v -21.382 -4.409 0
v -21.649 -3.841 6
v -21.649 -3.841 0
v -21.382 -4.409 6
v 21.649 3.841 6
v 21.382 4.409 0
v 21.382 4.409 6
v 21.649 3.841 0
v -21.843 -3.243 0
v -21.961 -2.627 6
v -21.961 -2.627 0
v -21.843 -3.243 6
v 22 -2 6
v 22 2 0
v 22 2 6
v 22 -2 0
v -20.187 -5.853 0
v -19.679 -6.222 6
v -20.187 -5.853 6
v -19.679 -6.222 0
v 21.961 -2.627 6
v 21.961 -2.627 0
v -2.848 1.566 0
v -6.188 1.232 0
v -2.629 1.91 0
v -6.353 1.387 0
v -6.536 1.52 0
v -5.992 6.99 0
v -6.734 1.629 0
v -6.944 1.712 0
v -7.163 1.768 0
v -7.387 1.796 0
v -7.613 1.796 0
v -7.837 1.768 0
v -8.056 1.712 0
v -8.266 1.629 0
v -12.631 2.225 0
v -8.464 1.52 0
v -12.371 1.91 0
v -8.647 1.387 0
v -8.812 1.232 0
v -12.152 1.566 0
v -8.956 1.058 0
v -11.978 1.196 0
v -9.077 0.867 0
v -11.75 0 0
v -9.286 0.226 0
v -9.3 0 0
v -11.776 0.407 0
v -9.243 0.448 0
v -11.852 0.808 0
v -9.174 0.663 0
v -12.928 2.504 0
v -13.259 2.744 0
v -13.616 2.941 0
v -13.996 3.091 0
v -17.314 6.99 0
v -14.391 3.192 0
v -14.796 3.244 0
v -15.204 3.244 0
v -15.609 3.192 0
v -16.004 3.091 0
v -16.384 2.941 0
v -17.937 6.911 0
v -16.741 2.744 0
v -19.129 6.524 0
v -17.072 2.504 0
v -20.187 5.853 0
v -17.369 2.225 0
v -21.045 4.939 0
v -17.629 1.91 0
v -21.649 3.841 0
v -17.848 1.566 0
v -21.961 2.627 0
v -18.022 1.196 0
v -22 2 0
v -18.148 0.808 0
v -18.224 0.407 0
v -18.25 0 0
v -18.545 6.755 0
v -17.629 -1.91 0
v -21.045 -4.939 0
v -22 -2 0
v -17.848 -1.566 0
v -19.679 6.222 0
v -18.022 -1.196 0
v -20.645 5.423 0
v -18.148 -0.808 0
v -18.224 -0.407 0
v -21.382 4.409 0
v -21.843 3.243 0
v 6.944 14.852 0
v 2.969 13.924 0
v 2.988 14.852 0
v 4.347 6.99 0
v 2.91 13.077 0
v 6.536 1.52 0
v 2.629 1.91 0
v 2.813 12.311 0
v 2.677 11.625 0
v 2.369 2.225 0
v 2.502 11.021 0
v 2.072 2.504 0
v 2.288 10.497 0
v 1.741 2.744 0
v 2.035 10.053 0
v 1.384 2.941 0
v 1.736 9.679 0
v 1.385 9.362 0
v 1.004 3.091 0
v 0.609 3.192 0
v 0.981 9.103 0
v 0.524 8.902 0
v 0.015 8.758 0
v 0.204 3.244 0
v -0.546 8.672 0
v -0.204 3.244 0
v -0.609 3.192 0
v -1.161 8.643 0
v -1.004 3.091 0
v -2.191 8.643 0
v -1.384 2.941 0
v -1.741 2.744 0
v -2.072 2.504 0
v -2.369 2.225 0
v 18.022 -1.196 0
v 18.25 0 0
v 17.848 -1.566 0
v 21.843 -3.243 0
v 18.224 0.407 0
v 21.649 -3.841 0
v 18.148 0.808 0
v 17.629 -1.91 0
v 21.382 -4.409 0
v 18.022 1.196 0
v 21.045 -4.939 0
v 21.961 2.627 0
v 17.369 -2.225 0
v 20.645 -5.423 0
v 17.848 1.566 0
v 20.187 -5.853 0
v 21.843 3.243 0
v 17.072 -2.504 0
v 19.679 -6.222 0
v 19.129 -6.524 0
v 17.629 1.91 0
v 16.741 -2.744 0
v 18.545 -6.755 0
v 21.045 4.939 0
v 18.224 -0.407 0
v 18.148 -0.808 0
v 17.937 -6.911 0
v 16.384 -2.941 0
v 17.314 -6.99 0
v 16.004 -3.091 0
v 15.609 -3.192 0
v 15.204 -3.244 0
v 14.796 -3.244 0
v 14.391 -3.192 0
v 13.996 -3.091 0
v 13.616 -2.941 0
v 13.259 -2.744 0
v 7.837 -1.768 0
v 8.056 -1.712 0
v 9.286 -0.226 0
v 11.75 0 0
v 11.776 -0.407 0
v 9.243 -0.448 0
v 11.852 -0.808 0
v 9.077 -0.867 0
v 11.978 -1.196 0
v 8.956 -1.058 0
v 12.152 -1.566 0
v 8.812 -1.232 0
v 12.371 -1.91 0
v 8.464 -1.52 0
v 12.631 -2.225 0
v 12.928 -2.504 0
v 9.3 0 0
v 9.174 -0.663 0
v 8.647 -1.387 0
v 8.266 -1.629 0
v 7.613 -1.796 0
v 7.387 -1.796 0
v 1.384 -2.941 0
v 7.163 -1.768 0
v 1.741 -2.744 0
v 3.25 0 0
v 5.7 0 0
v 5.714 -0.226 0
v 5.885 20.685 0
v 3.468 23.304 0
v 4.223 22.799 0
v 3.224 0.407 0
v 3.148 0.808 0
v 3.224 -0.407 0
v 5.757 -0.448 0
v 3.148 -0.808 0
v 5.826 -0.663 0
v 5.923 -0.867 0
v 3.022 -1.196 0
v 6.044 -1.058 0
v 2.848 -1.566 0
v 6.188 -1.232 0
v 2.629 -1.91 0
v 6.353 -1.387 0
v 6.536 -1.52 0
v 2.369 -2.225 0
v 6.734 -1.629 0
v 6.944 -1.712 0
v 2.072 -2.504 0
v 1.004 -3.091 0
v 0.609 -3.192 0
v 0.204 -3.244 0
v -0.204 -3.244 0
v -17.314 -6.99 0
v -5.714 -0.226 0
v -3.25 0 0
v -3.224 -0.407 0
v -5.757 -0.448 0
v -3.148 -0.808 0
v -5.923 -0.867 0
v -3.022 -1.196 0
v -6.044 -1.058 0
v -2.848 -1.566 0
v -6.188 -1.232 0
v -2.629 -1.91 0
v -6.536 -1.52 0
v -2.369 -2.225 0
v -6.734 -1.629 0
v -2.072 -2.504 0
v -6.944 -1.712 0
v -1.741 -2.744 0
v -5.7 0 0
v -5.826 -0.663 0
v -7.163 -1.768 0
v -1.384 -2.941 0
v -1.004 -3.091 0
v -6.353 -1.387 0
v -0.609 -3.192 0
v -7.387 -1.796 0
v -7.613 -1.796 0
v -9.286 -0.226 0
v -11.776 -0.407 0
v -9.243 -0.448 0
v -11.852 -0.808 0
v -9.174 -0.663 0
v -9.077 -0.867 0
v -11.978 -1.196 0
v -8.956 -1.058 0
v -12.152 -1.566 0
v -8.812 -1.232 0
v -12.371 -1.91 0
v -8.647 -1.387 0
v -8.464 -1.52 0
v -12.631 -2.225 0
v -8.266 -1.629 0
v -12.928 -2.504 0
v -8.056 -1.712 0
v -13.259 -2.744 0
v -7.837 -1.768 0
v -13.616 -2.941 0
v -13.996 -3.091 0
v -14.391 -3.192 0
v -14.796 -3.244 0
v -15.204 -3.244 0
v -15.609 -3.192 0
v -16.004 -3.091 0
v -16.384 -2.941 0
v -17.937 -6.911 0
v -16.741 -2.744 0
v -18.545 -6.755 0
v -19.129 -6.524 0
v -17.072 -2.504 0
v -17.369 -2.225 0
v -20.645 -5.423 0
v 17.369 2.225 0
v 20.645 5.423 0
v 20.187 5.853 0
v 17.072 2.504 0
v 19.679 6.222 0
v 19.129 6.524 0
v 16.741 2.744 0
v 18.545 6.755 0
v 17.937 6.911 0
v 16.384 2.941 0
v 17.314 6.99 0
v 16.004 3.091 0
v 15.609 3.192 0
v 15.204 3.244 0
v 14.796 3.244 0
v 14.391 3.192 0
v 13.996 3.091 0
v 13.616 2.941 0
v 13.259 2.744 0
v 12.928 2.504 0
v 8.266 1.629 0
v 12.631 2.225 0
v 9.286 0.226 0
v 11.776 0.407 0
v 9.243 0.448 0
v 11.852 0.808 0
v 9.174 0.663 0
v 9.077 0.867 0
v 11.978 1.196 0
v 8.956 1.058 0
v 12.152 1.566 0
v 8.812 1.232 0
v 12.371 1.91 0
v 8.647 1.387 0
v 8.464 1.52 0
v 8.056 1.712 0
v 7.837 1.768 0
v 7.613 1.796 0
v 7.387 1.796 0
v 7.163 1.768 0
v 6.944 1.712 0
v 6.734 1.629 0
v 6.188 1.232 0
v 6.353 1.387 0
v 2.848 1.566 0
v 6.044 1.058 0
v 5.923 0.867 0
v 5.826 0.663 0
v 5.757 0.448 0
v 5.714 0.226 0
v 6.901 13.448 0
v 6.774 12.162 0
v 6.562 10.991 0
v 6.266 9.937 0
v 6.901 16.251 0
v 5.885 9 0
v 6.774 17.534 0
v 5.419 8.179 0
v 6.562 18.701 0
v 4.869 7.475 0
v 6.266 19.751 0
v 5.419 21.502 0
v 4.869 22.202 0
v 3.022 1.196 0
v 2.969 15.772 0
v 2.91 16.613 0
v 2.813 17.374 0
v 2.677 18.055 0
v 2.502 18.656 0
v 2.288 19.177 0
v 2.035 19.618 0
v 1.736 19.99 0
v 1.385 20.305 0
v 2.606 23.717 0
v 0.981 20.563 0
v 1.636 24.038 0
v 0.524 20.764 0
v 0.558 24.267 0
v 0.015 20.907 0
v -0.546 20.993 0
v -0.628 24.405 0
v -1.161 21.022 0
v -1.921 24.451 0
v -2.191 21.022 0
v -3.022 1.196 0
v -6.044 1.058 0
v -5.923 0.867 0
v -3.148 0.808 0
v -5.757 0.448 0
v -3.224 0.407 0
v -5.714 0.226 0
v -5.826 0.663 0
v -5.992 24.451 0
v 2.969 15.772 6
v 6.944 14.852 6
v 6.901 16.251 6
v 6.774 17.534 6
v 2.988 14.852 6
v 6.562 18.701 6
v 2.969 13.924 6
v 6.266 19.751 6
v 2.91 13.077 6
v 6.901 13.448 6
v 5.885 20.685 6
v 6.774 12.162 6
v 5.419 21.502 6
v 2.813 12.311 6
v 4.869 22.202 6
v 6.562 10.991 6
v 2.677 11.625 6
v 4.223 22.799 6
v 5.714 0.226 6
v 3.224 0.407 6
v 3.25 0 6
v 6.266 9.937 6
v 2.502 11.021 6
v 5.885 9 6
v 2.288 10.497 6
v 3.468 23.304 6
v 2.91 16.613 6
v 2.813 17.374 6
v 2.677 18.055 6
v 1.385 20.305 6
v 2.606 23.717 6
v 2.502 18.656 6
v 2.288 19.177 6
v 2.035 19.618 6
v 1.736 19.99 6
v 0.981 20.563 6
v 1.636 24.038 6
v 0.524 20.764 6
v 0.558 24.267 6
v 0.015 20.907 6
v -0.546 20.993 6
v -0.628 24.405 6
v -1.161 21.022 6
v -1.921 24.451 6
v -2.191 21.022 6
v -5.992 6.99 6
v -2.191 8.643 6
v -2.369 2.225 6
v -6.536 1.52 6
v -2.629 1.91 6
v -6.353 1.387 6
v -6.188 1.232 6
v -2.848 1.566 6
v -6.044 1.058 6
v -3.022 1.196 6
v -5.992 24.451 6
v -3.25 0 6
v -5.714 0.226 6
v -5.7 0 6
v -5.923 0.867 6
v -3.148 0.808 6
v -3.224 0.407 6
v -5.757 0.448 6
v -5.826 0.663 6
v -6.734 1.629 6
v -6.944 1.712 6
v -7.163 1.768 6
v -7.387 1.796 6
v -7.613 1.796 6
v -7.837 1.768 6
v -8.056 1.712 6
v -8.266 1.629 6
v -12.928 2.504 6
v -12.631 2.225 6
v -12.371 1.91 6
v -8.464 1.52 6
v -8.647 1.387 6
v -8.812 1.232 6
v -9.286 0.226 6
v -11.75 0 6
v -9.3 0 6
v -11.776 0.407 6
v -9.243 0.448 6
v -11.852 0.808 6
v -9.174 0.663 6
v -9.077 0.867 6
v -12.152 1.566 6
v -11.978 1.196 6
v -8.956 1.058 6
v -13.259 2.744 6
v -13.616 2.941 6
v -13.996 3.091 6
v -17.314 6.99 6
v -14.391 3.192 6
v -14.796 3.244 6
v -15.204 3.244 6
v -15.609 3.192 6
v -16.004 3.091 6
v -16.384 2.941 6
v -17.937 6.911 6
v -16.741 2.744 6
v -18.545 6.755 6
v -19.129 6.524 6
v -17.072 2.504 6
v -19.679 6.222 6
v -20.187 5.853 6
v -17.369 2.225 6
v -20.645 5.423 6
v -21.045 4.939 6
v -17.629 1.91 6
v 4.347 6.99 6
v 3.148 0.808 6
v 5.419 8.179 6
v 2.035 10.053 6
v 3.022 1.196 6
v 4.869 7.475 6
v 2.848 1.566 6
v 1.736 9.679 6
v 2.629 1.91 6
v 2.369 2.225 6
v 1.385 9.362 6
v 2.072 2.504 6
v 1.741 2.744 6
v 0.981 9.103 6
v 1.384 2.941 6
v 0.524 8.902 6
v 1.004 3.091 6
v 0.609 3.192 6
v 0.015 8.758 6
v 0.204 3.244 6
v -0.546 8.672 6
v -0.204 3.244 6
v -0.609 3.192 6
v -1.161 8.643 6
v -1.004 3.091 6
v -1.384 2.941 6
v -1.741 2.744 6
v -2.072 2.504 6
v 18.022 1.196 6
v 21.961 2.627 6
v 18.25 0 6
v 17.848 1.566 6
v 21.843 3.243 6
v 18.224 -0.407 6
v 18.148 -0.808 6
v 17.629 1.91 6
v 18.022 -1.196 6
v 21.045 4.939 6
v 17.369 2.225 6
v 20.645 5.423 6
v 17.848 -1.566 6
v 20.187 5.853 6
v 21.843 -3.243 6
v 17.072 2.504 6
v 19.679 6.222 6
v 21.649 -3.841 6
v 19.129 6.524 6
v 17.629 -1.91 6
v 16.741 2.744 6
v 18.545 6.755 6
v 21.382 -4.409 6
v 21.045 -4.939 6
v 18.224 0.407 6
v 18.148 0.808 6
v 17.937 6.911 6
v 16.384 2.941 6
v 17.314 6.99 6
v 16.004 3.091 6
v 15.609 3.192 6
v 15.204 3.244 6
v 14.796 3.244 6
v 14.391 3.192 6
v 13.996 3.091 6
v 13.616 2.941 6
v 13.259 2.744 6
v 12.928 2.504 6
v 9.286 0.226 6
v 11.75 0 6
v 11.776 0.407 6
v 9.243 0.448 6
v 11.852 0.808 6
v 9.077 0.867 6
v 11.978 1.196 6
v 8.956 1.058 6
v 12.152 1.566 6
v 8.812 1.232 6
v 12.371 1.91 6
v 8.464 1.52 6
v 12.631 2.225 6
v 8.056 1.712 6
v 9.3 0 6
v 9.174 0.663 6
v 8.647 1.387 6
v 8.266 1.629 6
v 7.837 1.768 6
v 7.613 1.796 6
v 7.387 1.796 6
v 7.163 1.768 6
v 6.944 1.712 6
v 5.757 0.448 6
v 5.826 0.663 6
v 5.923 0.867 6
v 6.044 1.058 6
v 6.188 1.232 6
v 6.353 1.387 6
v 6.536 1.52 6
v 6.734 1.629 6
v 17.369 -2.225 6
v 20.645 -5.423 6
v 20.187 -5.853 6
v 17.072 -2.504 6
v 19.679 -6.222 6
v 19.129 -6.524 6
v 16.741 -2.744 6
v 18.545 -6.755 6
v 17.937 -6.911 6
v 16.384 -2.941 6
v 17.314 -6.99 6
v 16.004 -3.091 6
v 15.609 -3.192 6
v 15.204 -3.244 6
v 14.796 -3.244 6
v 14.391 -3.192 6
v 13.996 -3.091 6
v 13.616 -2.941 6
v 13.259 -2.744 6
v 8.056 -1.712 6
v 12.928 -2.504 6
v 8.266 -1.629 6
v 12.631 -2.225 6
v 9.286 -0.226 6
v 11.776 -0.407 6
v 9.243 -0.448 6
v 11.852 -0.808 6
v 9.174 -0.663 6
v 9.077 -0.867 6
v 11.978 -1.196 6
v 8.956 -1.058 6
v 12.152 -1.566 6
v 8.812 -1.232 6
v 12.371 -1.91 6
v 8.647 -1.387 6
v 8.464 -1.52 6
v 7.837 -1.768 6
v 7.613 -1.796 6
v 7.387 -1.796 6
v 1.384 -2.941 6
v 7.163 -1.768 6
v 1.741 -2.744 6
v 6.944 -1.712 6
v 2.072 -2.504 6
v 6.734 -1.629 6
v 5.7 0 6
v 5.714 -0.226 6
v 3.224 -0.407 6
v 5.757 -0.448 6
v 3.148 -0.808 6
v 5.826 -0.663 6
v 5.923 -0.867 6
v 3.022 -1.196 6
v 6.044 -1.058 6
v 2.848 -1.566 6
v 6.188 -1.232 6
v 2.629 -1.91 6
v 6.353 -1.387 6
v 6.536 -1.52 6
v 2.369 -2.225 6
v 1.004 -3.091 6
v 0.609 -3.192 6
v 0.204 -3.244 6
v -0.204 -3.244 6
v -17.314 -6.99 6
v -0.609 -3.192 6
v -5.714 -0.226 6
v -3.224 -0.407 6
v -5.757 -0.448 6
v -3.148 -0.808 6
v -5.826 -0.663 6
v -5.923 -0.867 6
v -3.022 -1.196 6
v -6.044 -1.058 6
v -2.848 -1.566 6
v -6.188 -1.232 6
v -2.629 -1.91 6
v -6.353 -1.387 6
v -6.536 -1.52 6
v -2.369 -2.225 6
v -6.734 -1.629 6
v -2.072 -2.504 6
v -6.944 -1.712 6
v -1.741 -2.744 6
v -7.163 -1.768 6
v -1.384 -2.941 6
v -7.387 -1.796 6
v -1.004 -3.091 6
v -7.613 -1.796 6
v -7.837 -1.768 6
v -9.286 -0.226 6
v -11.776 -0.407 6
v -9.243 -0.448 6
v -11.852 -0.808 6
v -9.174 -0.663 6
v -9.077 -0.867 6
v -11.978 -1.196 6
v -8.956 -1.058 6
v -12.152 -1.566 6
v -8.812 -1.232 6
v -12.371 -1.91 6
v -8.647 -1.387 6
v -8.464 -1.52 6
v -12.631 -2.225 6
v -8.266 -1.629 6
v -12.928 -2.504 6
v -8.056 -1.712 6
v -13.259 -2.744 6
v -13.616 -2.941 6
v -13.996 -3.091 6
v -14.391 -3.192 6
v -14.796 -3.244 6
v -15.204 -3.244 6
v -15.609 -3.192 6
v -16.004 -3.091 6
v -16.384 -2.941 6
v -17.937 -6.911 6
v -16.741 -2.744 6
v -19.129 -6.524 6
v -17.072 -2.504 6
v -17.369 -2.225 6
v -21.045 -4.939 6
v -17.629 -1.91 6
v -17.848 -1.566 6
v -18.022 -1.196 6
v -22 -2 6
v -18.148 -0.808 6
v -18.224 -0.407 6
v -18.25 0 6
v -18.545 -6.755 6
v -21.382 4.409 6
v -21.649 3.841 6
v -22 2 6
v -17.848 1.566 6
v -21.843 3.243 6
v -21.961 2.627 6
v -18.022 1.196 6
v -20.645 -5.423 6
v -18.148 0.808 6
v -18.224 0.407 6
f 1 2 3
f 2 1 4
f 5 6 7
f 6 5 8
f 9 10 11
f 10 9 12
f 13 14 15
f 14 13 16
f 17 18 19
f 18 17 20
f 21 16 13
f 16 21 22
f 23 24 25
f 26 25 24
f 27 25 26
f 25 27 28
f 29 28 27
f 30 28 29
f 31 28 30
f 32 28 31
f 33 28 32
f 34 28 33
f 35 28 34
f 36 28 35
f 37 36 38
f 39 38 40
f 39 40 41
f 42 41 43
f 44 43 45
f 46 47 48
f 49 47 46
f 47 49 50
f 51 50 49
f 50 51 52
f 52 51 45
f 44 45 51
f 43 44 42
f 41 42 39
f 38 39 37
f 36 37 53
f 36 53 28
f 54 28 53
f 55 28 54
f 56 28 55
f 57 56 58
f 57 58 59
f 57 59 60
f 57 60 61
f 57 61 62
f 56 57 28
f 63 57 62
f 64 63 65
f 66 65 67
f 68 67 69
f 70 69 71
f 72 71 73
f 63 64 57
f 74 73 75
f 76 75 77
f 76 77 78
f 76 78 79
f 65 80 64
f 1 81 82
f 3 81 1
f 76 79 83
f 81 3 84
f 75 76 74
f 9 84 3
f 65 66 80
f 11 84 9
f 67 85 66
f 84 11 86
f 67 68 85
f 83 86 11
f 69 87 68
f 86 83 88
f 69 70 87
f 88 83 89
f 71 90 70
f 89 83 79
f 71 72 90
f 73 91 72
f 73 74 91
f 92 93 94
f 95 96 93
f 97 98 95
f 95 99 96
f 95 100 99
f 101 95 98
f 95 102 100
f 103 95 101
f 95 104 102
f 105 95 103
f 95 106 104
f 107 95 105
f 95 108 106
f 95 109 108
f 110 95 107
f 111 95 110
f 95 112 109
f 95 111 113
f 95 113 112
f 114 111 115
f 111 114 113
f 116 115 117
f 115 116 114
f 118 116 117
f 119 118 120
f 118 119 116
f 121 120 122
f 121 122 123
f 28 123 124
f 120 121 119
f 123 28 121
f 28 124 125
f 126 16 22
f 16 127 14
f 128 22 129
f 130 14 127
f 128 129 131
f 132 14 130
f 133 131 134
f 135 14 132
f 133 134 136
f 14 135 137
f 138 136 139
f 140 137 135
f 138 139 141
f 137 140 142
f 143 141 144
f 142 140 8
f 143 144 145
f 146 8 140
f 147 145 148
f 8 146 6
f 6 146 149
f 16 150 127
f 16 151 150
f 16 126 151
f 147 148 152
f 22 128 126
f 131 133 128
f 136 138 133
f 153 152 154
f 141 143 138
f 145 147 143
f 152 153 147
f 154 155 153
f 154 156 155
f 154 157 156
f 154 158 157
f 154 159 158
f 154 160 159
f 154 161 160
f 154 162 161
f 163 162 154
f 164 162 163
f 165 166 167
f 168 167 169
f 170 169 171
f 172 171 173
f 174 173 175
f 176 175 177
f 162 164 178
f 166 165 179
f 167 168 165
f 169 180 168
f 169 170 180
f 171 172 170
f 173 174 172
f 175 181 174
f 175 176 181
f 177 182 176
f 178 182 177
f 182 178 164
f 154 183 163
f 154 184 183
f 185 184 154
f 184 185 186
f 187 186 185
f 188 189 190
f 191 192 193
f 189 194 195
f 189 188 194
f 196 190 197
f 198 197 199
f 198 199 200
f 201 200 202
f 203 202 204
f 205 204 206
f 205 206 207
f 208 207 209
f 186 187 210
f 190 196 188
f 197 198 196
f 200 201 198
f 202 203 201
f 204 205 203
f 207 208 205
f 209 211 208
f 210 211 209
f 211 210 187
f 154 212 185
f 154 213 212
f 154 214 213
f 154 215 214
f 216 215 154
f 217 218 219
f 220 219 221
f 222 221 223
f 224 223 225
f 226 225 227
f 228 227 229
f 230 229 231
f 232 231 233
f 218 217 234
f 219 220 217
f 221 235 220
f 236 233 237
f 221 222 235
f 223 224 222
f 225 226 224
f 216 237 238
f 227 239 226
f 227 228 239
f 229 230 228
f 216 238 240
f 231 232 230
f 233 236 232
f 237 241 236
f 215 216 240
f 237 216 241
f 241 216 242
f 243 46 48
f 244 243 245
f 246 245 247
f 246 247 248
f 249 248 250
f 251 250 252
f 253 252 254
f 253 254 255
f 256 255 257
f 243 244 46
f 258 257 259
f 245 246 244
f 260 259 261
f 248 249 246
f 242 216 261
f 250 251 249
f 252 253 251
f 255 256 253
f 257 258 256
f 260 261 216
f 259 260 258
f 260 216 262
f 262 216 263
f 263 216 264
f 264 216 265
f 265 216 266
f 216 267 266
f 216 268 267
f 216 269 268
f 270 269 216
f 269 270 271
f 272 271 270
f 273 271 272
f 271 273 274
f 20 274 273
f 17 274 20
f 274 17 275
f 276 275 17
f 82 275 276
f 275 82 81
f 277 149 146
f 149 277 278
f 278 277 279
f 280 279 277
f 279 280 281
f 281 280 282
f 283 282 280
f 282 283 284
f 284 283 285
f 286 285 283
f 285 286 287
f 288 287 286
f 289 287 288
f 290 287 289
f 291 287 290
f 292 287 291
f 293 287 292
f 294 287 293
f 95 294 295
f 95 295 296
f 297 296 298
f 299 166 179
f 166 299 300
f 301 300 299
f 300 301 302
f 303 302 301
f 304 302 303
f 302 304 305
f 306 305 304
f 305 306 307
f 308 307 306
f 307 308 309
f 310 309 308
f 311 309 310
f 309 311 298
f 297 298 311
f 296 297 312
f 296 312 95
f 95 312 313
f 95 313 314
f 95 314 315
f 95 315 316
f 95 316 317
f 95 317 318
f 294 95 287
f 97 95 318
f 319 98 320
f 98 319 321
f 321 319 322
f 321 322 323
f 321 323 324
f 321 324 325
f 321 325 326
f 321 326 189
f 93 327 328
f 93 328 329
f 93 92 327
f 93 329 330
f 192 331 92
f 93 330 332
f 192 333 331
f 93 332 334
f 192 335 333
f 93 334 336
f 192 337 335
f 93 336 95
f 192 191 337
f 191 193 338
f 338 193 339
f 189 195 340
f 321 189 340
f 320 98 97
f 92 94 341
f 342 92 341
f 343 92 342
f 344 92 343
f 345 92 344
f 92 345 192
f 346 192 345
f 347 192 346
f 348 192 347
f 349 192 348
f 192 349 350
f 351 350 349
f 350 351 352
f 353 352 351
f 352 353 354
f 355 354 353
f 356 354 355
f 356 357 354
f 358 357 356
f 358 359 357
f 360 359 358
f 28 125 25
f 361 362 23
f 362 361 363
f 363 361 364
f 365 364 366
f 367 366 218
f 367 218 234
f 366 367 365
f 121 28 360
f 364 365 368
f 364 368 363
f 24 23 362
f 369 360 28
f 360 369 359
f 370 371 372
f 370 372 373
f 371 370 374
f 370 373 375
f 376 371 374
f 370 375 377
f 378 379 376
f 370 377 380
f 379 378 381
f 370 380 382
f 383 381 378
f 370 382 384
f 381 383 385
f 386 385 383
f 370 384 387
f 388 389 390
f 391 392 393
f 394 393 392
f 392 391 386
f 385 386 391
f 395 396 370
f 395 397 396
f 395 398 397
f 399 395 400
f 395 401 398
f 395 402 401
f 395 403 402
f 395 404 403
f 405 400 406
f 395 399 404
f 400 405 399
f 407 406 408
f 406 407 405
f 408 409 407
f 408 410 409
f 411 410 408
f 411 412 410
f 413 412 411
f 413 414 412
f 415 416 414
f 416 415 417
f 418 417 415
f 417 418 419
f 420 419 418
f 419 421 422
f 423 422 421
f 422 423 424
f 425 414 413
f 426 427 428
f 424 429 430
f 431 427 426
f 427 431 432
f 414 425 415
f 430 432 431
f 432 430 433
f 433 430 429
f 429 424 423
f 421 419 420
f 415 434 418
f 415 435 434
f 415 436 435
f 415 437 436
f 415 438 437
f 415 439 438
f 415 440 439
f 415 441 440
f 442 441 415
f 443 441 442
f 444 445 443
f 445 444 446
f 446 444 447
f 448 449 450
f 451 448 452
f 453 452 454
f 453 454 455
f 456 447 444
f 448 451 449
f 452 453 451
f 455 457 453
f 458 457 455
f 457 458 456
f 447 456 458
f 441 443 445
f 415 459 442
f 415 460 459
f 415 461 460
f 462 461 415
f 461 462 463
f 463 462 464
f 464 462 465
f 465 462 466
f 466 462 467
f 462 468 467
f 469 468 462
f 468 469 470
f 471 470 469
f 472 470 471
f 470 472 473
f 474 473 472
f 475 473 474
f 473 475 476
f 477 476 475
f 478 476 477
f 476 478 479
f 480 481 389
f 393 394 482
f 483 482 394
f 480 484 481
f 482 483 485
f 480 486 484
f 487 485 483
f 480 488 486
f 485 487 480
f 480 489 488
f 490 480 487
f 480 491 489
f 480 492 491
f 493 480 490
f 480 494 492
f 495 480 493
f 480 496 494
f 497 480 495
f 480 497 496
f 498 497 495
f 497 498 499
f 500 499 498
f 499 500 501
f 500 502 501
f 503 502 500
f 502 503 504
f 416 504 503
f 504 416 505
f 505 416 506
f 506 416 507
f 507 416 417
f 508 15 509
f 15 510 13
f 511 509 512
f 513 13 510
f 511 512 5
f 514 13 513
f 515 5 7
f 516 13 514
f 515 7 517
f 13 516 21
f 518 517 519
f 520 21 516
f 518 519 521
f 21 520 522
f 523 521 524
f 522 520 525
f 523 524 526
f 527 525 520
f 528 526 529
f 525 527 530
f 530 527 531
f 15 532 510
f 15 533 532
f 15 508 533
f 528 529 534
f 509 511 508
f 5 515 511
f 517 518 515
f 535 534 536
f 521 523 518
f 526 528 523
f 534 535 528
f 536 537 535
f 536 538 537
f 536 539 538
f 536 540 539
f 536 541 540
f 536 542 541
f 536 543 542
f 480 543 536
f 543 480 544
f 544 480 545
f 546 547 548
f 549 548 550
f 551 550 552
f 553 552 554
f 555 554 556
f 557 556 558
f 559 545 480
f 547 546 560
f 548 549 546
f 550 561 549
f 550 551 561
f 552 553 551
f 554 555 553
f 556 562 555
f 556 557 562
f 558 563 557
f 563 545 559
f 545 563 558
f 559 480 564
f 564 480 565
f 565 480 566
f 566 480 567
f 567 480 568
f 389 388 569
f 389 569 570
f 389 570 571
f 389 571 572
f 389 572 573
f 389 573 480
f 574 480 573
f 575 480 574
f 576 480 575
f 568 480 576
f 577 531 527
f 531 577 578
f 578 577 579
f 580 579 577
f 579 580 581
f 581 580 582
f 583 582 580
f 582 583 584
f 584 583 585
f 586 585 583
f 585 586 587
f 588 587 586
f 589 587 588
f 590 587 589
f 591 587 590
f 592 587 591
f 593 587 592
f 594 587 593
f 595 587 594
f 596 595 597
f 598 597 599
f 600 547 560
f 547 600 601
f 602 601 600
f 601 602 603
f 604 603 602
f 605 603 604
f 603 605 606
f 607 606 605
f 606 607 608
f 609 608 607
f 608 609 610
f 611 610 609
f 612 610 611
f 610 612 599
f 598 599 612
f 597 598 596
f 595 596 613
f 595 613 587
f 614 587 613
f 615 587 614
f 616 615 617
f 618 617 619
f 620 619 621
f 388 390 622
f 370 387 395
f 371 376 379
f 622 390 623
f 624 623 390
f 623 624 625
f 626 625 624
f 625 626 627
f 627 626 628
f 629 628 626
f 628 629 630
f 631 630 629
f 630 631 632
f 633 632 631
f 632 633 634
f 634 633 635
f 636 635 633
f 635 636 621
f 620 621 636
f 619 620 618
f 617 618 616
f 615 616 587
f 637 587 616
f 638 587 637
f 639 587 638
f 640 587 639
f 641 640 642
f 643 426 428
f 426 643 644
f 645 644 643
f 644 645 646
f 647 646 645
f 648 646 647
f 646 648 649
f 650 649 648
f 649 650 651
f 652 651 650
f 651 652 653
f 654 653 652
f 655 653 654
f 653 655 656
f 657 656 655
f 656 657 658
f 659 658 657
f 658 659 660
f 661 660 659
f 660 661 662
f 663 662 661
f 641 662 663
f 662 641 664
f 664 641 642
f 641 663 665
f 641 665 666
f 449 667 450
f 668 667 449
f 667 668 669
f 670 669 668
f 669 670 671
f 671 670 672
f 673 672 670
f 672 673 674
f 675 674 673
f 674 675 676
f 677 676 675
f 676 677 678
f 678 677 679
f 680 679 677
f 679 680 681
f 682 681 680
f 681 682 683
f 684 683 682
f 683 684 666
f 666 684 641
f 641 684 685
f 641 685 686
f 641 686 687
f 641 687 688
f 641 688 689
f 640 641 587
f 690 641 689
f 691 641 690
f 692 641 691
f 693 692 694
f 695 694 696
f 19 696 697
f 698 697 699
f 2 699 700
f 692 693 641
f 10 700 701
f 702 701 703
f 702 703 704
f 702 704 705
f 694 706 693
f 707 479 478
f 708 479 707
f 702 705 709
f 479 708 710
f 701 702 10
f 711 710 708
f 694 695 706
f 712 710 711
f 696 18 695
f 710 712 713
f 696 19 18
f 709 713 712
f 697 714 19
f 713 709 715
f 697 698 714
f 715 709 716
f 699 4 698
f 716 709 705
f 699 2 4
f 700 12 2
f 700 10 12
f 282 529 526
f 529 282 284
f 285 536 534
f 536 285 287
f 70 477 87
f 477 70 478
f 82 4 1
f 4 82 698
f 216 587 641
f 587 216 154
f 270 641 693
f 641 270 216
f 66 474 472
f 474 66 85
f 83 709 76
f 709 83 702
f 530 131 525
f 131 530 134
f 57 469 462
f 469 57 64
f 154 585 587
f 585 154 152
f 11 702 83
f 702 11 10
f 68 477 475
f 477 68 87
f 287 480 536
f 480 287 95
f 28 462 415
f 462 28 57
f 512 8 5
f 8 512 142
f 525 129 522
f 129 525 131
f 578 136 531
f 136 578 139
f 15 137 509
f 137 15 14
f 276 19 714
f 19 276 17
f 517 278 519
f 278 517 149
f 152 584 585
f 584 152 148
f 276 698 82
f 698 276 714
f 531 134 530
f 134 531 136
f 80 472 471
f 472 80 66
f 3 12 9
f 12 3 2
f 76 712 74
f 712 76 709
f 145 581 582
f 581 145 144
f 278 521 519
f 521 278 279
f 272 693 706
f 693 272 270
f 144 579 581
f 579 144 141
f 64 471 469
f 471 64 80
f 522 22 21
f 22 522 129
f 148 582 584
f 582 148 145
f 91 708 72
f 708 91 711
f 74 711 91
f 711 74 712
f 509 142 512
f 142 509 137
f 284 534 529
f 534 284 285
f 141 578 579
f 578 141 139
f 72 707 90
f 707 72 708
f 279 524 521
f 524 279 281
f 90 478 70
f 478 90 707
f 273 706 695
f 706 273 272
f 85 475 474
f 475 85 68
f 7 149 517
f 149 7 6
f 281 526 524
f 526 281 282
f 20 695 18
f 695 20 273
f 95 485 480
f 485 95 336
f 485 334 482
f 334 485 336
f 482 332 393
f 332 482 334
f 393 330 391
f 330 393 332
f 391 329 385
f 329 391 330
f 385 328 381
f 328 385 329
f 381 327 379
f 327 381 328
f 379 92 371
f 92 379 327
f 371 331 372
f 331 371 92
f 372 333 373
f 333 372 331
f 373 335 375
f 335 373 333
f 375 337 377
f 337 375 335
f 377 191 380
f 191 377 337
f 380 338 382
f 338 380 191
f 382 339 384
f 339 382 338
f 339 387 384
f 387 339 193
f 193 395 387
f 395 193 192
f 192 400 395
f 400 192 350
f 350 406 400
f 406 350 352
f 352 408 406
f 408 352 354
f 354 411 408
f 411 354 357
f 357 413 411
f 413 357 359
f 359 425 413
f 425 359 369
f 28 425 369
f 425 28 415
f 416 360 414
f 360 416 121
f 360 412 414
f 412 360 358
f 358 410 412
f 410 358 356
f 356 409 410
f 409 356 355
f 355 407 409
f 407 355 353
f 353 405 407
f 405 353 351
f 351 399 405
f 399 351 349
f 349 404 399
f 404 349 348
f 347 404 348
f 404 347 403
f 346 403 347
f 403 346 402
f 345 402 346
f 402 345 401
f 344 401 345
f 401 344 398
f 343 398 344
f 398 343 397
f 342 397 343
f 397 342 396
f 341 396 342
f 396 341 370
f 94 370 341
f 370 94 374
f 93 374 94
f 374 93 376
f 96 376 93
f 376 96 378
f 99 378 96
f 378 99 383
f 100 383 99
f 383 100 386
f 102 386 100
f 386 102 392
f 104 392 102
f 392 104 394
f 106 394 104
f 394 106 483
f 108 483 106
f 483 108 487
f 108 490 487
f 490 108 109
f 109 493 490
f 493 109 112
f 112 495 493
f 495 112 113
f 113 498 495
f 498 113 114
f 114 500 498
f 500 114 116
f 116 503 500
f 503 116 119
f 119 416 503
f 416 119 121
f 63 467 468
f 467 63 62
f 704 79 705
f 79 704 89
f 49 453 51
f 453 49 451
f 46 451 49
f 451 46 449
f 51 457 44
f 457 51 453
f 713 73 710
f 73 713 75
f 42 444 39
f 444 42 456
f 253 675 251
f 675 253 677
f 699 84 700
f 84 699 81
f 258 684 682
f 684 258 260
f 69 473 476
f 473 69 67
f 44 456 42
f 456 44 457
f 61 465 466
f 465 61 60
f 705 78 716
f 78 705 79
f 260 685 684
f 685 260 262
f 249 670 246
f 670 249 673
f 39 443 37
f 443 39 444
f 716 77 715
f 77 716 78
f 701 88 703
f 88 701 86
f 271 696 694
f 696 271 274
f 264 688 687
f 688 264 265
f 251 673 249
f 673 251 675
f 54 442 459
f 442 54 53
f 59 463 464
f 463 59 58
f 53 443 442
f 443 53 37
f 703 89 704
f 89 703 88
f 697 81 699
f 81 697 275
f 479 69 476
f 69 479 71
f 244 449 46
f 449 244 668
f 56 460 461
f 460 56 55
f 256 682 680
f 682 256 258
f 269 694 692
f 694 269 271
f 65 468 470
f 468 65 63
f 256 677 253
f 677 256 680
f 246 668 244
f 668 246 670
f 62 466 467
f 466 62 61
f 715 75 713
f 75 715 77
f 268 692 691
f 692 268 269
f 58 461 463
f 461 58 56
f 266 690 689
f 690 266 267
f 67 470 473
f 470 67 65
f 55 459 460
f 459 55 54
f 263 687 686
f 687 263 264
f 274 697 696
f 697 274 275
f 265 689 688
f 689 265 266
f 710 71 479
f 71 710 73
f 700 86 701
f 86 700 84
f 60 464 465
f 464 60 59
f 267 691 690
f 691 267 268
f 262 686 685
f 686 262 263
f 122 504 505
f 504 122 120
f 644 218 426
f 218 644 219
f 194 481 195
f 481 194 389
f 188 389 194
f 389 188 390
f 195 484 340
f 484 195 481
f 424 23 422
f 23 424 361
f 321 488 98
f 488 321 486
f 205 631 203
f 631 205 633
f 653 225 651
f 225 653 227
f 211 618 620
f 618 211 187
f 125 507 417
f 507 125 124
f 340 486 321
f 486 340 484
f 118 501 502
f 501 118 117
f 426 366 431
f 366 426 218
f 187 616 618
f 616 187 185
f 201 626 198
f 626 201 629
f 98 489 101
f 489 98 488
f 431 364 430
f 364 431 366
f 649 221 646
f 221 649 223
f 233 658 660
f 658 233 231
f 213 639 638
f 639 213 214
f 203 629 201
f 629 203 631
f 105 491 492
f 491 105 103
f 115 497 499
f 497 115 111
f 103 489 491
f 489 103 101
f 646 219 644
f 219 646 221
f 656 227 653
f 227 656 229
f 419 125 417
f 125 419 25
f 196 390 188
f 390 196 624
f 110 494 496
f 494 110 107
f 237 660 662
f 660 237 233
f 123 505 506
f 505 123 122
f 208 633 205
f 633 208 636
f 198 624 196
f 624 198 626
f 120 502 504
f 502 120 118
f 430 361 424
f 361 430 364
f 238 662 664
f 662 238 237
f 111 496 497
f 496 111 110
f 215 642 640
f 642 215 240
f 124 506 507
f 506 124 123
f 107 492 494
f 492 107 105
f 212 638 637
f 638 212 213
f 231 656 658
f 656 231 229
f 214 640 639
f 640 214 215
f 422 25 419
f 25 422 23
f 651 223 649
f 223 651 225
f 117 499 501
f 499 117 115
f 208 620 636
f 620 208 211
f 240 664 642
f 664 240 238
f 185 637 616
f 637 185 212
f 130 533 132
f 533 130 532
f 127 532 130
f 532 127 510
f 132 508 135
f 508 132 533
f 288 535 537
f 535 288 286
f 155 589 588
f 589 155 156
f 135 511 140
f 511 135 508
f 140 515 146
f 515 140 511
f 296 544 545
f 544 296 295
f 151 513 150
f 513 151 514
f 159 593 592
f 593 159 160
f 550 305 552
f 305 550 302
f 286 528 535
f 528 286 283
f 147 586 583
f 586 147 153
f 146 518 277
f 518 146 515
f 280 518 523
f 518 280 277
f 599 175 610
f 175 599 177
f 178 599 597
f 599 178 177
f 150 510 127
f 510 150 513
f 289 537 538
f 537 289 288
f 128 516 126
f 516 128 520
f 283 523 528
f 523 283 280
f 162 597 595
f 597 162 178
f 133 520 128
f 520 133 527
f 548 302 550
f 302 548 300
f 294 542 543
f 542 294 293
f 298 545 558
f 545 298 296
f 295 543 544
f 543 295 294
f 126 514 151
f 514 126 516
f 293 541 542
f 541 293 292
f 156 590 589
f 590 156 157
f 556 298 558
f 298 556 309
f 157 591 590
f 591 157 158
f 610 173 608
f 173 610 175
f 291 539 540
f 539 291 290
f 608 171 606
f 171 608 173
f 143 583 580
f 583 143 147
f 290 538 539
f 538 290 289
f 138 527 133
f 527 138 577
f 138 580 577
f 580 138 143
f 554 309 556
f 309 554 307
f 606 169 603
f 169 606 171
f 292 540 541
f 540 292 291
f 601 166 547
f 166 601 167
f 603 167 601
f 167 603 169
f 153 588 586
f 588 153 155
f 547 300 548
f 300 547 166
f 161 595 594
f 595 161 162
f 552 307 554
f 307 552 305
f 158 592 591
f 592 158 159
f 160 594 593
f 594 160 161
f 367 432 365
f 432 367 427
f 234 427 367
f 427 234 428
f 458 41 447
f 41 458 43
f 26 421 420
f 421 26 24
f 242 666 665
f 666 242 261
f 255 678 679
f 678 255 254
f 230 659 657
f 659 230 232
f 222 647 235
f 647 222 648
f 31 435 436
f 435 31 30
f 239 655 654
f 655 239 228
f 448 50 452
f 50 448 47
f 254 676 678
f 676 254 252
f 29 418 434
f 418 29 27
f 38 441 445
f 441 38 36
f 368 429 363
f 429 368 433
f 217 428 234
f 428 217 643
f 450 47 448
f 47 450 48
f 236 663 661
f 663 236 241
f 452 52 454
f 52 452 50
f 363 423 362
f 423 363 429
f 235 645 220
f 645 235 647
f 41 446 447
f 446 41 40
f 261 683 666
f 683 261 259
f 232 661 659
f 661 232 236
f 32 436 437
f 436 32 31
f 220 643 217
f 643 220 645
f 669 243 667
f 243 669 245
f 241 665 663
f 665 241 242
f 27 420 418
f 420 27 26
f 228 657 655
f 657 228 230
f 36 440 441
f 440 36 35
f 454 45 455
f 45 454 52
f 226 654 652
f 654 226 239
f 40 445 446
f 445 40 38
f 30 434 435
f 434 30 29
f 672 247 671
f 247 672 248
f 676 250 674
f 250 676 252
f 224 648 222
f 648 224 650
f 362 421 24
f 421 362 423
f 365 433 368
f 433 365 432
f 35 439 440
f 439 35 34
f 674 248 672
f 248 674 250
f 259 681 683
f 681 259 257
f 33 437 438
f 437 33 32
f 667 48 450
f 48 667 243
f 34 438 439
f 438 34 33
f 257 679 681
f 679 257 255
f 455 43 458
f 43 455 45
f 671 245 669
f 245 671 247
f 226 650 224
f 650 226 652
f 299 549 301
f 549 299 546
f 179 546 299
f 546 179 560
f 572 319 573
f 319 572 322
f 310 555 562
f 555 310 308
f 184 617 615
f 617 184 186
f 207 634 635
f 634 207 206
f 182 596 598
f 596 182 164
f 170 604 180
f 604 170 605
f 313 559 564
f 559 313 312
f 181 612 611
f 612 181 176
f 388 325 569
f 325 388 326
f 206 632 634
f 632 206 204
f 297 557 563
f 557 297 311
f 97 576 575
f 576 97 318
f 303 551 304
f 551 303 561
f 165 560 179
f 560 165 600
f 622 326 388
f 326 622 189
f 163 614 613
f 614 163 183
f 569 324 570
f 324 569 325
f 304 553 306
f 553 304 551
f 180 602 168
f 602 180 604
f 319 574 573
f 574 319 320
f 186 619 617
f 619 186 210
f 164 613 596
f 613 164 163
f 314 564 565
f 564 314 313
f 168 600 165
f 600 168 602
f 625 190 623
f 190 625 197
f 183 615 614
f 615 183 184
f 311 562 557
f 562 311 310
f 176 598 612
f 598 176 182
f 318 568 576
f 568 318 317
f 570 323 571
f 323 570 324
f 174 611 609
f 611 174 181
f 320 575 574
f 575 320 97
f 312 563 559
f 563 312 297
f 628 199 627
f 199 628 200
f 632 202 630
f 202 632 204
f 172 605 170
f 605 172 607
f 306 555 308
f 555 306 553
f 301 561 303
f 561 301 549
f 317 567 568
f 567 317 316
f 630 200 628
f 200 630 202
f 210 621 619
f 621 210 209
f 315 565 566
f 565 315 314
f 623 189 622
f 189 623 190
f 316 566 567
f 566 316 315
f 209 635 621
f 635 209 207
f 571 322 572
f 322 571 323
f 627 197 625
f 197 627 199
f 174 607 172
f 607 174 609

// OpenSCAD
$fn = 50;


difference() {
	union() {
		hull() {
			translate(v = [-17.0000000000, 2.0000000000, 0]) {
				cylinder(h = 6, r = 5);
			}
			translate(v = [17.0000000000, 2.0000000000, 0]) {
				cylinder(h = 6, r = 5);
			}
			translate(v = [-17.0000000000, -2.0000000000, 0]) {
				cylinder(h = 6, r = 5);
			}
			translate(v = [17.0000000000, -2.0000000000, 0]) {
				cylinder(h = 6, r = 5);
			}
		}
		translate(v = [0, 24, 0]) {
			linear_extrude(height = 6) {
				text(font = "DejaVu Sans Mono:style=Bold", halign = "center", size = 19.0000000000, text = "D", valign = "top");
			}
		}
	}
	union() {
		translate(v = [-15.0000000000, 0.0000000000, 0]) {
			translate(v = [0, 0, -100]) {
				cylinder(h = 200, r = 3.2500000000);
			}
		}
		translate(v = [0, 0, -100]) {
			cylinder(h = 200, r = 3.2500000000);
		}
		translate(v = [15.0000000000, 0.0000000000, 0]) {
			translate(v = [0, 0, -100]) {
				cylinder(h = 200, r = 3.2500000000);
			}
		}
		translate(v = [-15.0000000000, 0.0000000000, 0]) {
			translate(v = [0, 0, -100]) {
				cylinder(h = 200, r = 1.8000000000);
			}
		}
		translate(v = [-7.5000000000, 0.0000000000, 0]) {
			translate(v = [0, 0, -100]) {
				cylinder(h = 200, r = 1.8000000000);
			}
		}
		translate(v = [0, 0, -100]) {
			cylinder(h = 200, r = 1.8000000000);
		}
		translate(v = [7.5000000000, 0.0000000000, 0]) {
			translate(v = [0, 0, -100]) {
				cylinder(h = 200, r = 1.8000000000);
			}
		}
		translate(v = [15.0000000000, 0.0000000000, 0]) {
			translate(v = [0, 0, -100]) {
				cylinder(h = 200, r = 1.8000000000);
			}
		}
	}
}
